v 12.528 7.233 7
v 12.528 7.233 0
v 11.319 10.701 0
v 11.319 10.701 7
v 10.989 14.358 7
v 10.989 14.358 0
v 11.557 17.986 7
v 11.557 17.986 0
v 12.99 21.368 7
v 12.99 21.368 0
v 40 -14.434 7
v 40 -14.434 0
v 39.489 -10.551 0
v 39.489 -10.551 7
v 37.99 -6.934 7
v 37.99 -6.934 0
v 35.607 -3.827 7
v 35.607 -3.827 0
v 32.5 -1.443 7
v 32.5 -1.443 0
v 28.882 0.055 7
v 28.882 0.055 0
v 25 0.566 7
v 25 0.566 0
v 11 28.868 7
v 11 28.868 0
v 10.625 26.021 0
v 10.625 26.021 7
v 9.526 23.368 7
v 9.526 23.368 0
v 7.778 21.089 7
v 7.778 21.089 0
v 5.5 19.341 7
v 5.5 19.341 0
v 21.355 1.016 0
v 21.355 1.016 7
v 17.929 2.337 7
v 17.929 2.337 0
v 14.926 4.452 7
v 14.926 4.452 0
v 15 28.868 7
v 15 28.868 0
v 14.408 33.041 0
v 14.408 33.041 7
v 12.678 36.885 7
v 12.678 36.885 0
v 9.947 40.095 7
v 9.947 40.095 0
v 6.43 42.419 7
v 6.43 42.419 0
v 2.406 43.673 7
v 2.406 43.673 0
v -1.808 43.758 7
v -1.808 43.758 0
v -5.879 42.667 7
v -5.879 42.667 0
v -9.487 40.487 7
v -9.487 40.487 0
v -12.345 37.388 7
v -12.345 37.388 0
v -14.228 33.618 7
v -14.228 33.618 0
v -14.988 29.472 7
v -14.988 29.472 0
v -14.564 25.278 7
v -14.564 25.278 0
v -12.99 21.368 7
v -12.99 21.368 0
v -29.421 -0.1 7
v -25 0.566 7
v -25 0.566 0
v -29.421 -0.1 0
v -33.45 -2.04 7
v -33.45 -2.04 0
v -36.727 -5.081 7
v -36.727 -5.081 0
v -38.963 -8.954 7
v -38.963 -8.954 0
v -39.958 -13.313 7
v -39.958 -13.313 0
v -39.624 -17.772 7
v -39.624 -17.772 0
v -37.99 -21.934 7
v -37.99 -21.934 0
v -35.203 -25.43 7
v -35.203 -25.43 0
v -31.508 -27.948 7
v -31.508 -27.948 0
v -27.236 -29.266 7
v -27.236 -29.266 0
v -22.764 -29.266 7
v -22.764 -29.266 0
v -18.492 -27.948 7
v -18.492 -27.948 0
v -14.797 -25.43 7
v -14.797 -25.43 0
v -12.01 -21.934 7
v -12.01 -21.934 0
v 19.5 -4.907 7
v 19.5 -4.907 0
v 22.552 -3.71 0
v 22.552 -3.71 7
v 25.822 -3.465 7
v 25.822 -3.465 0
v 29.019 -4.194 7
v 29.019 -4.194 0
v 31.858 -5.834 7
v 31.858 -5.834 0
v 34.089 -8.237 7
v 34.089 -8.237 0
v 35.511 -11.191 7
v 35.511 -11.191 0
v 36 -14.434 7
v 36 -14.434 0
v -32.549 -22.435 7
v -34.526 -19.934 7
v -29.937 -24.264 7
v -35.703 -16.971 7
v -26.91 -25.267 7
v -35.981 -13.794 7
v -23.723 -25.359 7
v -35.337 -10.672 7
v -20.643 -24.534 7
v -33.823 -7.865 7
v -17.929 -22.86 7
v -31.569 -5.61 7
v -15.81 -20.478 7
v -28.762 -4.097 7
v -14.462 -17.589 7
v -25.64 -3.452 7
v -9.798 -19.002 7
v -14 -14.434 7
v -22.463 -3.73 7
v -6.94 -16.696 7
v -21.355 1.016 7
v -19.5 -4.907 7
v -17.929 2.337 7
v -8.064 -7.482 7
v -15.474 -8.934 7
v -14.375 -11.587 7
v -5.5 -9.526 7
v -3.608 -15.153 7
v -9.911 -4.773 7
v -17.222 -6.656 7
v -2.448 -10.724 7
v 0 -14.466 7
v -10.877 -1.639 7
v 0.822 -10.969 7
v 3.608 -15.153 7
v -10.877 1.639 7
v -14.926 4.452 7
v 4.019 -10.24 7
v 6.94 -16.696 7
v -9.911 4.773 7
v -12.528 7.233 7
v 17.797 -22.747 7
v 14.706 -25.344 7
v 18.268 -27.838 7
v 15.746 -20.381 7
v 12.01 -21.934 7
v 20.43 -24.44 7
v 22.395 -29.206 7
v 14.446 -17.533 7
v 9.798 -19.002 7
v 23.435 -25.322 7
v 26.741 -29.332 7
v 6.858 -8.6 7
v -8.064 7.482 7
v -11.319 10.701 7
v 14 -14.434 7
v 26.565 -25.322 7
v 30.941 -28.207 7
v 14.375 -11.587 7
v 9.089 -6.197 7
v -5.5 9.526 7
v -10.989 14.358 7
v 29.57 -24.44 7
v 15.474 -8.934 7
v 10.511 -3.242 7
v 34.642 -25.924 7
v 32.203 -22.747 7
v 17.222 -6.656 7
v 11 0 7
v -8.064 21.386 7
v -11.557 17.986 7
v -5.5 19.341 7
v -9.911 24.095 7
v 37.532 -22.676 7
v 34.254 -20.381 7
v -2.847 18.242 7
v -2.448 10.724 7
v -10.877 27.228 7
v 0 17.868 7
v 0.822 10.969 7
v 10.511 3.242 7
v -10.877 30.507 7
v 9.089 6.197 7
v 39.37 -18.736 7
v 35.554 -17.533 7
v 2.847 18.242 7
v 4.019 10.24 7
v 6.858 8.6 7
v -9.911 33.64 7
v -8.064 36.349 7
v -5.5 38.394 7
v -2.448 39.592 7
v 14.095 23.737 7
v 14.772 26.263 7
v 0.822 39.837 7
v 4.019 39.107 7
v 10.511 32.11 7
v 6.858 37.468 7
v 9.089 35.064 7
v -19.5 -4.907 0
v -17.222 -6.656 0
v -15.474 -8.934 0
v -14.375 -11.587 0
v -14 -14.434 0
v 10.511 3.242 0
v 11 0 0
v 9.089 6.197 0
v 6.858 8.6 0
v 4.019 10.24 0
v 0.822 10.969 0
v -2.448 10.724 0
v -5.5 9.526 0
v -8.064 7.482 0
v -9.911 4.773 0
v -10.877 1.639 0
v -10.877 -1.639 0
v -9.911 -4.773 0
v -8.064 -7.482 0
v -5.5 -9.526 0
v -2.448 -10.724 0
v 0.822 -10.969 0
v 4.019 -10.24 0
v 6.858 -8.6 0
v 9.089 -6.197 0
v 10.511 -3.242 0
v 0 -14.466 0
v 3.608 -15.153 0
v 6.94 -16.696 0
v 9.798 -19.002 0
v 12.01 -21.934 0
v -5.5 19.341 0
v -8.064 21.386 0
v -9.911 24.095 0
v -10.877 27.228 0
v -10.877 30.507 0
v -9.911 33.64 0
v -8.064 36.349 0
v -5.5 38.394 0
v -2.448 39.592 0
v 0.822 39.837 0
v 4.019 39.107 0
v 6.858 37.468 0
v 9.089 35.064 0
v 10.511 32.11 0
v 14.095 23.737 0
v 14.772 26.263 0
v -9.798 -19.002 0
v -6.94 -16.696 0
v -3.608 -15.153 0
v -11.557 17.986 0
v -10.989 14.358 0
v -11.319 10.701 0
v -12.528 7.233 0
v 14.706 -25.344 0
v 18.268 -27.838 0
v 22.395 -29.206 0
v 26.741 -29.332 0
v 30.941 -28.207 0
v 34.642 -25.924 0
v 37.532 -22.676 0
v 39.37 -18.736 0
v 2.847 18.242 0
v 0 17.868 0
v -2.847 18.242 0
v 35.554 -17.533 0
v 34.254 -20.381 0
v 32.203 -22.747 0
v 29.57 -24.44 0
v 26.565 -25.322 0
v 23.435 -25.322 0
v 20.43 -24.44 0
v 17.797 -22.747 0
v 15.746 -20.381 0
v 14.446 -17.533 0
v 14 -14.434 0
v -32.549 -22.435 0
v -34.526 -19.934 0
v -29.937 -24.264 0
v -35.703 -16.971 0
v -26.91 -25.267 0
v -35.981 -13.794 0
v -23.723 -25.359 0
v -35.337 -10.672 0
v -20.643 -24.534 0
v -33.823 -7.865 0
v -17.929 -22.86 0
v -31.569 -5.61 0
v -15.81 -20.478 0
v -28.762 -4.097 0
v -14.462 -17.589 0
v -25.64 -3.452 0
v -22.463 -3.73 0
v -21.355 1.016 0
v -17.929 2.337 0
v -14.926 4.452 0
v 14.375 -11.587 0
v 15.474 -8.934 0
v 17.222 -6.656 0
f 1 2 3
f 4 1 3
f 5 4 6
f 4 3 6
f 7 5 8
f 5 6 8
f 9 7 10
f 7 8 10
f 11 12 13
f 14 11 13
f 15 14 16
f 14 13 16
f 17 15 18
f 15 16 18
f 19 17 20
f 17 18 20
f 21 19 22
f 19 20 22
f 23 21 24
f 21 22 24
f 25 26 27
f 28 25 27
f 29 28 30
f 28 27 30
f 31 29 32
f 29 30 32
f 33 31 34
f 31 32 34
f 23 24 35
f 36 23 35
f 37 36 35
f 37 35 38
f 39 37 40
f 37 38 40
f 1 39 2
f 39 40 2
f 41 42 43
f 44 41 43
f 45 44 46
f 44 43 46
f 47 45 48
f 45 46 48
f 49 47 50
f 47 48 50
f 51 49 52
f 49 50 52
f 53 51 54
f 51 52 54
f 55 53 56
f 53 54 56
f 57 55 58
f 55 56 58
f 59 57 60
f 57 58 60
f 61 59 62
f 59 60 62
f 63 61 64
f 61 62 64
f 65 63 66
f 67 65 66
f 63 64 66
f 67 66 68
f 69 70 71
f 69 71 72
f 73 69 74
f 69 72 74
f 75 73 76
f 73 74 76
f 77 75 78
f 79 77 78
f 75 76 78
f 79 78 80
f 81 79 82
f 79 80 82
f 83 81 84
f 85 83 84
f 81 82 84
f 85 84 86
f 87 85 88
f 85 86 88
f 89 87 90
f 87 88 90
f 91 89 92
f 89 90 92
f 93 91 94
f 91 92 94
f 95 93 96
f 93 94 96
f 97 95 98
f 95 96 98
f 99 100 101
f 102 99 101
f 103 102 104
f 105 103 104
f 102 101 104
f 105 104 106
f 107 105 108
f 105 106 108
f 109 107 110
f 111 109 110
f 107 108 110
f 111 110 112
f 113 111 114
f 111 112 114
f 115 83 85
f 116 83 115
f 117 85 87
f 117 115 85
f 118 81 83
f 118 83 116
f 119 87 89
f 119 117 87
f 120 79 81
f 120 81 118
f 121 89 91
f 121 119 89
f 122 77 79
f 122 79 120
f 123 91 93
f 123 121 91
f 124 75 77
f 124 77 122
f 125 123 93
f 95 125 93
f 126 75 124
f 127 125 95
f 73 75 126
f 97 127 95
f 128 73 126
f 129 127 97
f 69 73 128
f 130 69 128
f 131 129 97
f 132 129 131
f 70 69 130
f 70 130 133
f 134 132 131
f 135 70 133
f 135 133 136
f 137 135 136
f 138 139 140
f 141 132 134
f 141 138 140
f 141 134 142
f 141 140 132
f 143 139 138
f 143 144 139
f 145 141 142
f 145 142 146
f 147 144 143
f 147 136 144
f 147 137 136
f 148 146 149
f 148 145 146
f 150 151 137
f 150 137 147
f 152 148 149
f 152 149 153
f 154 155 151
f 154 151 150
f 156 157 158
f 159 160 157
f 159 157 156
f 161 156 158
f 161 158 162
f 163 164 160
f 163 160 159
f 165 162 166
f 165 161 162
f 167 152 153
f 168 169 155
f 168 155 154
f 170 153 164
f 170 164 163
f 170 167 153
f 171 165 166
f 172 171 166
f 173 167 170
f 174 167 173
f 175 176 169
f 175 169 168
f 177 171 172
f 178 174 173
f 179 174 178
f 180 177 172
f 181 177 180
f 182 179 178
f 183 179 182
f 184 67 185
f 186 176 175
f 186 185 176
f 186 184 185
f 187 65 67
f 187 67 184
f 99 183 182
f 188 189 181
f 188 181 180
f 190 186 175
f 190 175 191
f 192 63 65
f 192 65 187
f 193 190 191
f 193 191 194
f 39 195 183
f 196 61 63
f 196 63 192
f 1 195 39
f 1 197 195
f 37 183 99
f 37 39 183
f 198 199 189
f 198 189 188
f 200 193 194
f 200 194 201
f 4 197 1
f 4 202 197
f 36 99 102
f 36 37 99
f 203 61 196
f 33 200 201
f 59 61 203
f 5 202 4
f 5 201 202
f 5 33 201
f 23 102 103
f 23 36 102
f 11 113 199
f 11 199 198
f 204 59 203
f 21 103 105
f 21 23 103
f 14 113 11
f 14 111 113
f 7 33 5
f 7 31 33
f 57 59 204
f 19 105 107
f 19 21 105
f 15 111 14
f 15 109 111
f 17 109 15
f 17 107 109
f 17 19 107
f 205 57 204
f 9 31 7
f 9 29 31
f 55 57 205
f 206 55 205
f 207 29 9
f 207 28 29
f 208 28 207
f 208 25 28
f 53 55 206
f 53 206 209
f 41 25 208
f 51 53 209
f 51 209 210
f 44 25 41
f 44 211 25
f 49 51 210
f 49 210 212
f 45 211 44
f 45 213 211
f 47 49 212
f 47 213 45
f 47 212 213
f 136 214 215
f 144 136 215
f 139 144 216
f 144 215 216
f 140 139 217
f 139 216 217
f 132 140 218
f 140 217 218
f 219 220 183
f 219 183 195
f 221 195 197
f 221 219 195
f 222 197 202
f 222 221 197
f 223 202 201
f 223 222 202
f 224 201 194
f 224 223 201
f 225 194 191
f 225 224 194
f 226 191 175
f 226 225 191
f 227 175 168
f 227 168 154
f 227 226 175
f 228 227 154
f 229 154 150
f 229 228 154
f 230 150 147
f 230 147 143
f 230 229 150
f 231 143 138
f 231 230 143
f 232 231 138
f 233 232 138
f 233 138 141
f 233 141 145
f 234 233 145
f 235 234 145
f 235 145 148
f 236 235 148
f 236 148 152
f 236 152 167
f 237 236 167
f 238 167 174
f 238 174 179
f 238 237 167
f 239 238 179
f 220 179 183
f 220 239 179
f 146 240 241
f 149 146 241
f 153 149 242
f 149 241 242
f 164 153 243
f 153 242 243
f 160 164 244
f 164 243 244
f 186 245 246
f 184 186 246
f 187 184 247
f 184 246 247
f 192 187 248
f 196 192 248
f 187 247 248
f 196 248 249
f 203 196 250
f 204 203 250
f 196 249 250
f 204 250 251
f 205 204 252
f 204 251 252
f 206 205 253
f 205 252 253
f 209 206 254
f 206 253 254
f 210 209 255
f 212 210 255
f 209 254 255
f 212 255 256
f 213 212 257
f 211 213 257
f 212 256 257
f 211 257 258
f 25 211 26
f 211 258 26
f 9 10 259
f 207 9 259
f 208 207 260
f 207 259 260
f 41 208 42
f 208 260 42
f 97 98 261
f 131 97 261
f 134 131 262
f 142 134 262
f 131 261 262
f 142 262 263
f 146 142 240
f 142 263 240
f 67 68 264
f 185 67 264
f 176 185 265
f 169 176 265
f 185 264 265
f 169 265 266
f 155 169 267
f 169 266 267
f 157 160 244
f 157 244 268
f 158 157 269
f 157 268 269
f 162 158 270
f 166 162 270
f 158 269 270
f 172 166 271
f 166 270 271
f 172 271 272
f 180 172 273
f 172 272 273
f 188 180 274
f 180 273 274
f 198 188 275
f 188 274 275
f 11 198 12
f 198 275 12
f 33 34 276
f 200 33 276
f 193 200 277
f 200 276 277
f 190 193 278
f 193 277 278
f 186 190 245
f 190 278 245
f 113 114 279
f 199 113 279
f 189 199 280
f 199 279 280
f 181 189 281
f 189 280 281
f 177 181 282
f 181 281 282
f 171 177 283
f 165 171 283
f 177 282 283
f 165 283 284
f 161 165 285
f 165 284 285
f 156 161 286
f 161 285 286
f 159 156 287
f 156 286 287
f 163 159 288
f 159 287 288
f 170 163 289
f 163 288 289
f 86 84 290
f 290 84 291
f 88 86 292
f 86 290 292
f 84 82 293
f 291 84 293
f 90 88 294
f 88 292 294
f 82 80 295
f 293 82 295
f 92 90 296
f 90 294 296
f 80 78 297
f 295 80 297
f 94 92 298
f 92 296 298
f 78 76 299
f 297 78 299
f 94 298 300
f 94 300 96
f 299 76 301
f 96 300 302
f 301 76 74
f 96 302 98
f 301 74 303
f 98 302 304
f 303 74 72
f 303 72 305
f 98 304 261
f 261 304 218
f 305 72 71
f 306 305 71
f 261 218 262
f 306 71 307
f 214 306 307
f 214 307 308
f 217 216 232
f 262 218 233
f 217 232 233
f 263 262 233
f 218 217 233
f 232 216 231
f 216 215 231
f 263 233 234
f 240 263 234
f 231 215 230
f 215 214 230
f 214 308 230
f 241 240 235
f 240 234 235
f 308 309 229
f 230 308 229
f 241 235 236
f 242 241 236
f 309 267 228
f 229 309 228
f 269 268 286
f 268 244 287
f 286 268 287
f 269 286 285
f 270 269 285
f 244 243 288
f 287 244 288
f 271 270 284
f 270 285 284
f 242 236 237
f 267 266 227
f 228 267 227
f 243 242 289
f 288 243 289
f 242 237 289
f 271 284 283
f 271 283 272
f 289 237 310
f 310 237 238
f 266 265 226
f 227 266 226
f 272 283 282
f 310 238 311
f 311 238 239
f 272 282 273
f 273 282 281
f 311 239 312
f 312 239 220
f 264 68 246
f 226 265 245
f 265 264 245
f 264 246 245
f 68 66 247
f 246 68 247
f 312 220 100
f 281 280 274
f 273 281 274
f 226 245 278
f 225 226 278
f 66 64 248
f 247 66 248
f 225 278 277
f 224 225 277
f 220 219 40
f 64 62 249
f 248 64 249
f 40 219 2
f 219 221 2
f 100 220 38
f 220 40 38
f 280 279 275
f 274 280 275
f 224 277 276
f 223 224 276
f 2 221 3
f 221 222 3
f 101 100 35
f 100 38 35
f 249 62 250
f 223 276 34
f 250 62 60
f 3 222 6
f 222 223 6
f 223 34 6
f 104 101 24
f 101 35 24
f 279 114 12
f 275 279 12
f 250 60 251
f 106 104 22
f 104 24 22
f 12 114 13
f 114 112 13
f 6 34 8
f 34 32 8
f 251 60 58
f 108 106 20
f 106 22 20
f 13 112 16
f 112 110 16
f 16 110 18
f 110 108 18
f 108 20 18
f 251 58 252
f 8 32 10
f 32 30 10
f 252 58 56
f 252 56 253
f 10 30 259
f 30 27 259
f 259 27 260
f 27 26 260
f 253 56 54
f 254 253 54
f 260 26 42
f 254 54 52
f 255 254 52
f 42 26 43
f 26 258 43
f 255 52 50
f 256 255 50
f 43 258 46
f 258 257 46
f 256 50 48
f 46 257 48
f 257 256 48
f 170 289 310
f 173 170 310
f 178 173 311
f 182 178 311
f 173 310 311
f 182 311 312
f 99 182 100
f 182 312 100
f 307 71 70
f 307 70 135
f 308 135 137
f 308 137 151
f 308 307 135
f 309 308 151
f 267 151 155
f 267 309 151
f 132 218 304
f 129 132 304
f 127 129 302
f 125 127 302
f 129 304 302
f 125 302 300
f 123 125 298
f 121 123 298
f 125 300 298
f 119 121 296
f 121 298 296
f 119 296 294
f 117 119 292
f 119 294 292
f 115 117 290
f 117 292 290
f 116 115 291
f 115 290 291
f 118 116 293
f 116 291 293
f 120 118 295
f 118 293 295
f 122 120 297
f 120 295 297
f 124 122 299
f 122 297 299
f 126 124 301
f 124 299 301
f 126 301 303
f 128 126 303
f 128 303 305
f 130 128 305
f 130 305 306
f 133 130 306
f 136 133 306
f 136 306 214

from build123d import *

# Parameters (mm, degrees)
F0_R        = 11
F1_DEPTH    = 7
F2_T1_DEPTH = 7


# Not quite as in the source:
# - a fillet or chamfer that OpenCascade refuses, or shapes differently, is made with other operations: its cross-section is extruded or revolved along the edge and cut away or added


with BuildPart() as f1:
    # F0 (on Top) → F1 (new body)
    with BuildSketch(Plane.XY):
        with BuildLine():
            ThreePointArc((-17.5, -1.443375673), (-37.9903810568, -21.9337567297), (-10, -14.4337567297))
            Line((-10, -14.4337567297), (-14, -14.4337567297))
            ThreePointArc((-14, -14.4337567297), (-34.5262794416, -19.9337567297), (-19.5, -4.9074772881))
            Line((-19.5, -4.9074772881), (-17.5, -1.443375673))
        make_face()
        with BuildLine():
            ThreePointArc((-17.5, -1.443375673), (-12.0096189432, -6.9337567297), (-10, -14.4337567297))
            Line((-10, -14.4337567297), (10, -14.4337567297))
            ThreePointArc((10, -14.4337567297), (12.0096189432, -6.9337567297), (17.5, -1.443375673))
            Line((17.5, -1.443375673), (7.5, 15.8771324027))
            ThreePointArc((7.5, 15.8771324027), (0, 13.8675134595), (-7.5, 15.8771324027))
            Line((-7.5, 15.8771324027), (-17.5, -1.443375673))
        make_face()
        Circle(F0_R, mode=Mode.SUBTRACT)
        with BuildLine():
            Line((-14, -14.4337567297), (-10, -14.4337567297))
            ThreePointArc((-10, -14.4337567297), (-12.0096189432, -6.9337567297), (-17.5, -1.443375673))
            Line((-17.5, -1.443375673), (-19.5, -4.9074772881))
            ThreePointArc((-19.5, -4.9074772881), (-15.4737205584, -8.9337567297), (-14, -14.4337567297))
        make_face()
        with BuildLine():
            ThreePointArc((17.5, -1.443375673), (12.0096189432, -6.9337567297), (10, -14.4337567297))
            Line((10, -14.4337567297), (14, -14.4337567297))
            ThreePointArc((14, -14.4337567297), (15.4737205584, -8.9337567297), (19.5, -4.9074772881))
            Line((19.5, -4.9074772881), (17.5, -1.443375673))
        make_face()
        with BuildLine():
            Line((14, -14.4337567297), (10, -14.4337567297))
            ThreePointArc((10, -14.4337567297), (25, -29.4337567297), (40, -14.4337567297))
            ThreePointArc((40, -14.4337567297), (32.5, -1.443375673), (17.5, -1.443375673))
            Line((17.5, -1.443375673), (19.5, -4.9074772881))
            ThreePointArc((19.5, -4.9074772881), (30.5, -4.9074772881), (36, -14.4337567297))
            ThreePointArc((36, -14.4337567297), (25, -25.4337567297), (14, -14.4337567297))
        make_face()
        with BuildLine():
            ThreePointArc((15, 28.8675134595), (-7.5, 41.8578945162), (-7.5, 15.8771324027))
            Line((-7.5, 15.8771324027), (-5.5, 19.3412340179))
            ThreePointArc((-5.5, 19.3412340179), (-5.5, 38.3937929011), (11, 28.8675134595))
            ThreePointArc((11, 28.8675134595), (9.5262794416, 23.3675134595), (5.5, 19.3412340179))
            Line((5.5, 19.3412340179), (7.5, 15.8771324027))
            ThreePointArc((7.5, 15.8771324027), (12.9903810568, 21.3675134595), (15, 28.8675134595))
        make_face()
        with BuildLine():
            Line((-5.5, 19.3412340179), (-7.5, 15.8771324027))
            ThreePointArc((-7.5, 15.8771324027), (0, 13.8675134595), (7.5, 15.8771324027))
            Line((7.5, 15.8771324027), (5.5, 19.3412340179))
            ThreePointArc((5.5, 19.3412340179), (0, 17.8675134595), (-5.5, 19.3412340179))
        make_face()
    extrude(amount=F1_DEPTH)

    # F2: fillet of radius 15 on 6 edges, made by hand

    # F2_s2 → F2_t1 (join)
    with BuildSketch(Plane.XY):
        with BuildLine():
            ThreePointArc((12.9903810568, 6.3675134595), (10.9807621135, 13.8675134595), (12.9903810568, 21.3675134595))
            ThreePointArc((12.9903810568, 21.3675134595), (10.6066017178, 18.2609117417), (7.5, 15.8771324027))
            Line((7.5, 15.8771324027), (12.9903810568, 6.3675134595))
        make_face()
        with BuildLine():
            ThreePointArc((25, 0.5662432703), (17.5, 2.5758622135), (12.0096189432, 8.0662432703))
            Line((12.0096189432, 8.0662432703), (17.5, -1.443375673))
            ThreePointArc((17.5, -1.443375673), (21.1177143235, 0.0551306646), (25, 0.5662432703))
        make_face()
        with BuildLine():
            ThreePointArc((-12.9903810568, 21.3675134595), (-10.9807621135, 13.8675134595), (-12.9903810568, 6.3675134595))
            Line((-12.9903810568, 6.3675134595), (-7.5, 15.8771324027))
            ThreePointArc((-7.5, 15.8771324027), (-10.6066017178, 18.2609117417), (-12.9903810568, 21.3675134595))
        make_face()
        with BuildLine():
            ThreePointArc((-25, 0.5662432703), (-17.5, 2.5758622135), (-12.0096189432, 8.0662432703))
            Line((-12.0096189432, 8.0662432703), (-17.5, -1.443375673))
            ThreePointArc((-17.5, -1.443375673), (-21.1177143235, 0.0551306646), (-25, 0.5662432703))
        make_face()
        with BuildLine():
            ThreePointArc((-12.0096189432, -21.9337567297), (-6.5192378865, -16.443375673), (0.9807621135, -14.4337567297))
            Line((0.9807621135, -14.4337567297), (-10, -14.4337567297))
            ThreePointArc((-10, -14.4337567297), (-10.5111126057, -18.3160424063), (-12.0096189432, -21.9337567297))
        make_face()
        with BuildLine():
            ThreePointArc((-0.9807621135, -14.4337567297), (6.5192378865, -16.443375673), (12.0096189432, -21.9337567297))
            ThreePointArc((12.0096189432, -21.9337567297), (10.5111126057, -18.3160424063), (10, -14.4337567297))
            Line((10, -14.4337567297), (-0.9807621135, -14.4337567297))
        make_face()
    extrude(amount=F2_T1_DEPTH)


solid = f1.part
